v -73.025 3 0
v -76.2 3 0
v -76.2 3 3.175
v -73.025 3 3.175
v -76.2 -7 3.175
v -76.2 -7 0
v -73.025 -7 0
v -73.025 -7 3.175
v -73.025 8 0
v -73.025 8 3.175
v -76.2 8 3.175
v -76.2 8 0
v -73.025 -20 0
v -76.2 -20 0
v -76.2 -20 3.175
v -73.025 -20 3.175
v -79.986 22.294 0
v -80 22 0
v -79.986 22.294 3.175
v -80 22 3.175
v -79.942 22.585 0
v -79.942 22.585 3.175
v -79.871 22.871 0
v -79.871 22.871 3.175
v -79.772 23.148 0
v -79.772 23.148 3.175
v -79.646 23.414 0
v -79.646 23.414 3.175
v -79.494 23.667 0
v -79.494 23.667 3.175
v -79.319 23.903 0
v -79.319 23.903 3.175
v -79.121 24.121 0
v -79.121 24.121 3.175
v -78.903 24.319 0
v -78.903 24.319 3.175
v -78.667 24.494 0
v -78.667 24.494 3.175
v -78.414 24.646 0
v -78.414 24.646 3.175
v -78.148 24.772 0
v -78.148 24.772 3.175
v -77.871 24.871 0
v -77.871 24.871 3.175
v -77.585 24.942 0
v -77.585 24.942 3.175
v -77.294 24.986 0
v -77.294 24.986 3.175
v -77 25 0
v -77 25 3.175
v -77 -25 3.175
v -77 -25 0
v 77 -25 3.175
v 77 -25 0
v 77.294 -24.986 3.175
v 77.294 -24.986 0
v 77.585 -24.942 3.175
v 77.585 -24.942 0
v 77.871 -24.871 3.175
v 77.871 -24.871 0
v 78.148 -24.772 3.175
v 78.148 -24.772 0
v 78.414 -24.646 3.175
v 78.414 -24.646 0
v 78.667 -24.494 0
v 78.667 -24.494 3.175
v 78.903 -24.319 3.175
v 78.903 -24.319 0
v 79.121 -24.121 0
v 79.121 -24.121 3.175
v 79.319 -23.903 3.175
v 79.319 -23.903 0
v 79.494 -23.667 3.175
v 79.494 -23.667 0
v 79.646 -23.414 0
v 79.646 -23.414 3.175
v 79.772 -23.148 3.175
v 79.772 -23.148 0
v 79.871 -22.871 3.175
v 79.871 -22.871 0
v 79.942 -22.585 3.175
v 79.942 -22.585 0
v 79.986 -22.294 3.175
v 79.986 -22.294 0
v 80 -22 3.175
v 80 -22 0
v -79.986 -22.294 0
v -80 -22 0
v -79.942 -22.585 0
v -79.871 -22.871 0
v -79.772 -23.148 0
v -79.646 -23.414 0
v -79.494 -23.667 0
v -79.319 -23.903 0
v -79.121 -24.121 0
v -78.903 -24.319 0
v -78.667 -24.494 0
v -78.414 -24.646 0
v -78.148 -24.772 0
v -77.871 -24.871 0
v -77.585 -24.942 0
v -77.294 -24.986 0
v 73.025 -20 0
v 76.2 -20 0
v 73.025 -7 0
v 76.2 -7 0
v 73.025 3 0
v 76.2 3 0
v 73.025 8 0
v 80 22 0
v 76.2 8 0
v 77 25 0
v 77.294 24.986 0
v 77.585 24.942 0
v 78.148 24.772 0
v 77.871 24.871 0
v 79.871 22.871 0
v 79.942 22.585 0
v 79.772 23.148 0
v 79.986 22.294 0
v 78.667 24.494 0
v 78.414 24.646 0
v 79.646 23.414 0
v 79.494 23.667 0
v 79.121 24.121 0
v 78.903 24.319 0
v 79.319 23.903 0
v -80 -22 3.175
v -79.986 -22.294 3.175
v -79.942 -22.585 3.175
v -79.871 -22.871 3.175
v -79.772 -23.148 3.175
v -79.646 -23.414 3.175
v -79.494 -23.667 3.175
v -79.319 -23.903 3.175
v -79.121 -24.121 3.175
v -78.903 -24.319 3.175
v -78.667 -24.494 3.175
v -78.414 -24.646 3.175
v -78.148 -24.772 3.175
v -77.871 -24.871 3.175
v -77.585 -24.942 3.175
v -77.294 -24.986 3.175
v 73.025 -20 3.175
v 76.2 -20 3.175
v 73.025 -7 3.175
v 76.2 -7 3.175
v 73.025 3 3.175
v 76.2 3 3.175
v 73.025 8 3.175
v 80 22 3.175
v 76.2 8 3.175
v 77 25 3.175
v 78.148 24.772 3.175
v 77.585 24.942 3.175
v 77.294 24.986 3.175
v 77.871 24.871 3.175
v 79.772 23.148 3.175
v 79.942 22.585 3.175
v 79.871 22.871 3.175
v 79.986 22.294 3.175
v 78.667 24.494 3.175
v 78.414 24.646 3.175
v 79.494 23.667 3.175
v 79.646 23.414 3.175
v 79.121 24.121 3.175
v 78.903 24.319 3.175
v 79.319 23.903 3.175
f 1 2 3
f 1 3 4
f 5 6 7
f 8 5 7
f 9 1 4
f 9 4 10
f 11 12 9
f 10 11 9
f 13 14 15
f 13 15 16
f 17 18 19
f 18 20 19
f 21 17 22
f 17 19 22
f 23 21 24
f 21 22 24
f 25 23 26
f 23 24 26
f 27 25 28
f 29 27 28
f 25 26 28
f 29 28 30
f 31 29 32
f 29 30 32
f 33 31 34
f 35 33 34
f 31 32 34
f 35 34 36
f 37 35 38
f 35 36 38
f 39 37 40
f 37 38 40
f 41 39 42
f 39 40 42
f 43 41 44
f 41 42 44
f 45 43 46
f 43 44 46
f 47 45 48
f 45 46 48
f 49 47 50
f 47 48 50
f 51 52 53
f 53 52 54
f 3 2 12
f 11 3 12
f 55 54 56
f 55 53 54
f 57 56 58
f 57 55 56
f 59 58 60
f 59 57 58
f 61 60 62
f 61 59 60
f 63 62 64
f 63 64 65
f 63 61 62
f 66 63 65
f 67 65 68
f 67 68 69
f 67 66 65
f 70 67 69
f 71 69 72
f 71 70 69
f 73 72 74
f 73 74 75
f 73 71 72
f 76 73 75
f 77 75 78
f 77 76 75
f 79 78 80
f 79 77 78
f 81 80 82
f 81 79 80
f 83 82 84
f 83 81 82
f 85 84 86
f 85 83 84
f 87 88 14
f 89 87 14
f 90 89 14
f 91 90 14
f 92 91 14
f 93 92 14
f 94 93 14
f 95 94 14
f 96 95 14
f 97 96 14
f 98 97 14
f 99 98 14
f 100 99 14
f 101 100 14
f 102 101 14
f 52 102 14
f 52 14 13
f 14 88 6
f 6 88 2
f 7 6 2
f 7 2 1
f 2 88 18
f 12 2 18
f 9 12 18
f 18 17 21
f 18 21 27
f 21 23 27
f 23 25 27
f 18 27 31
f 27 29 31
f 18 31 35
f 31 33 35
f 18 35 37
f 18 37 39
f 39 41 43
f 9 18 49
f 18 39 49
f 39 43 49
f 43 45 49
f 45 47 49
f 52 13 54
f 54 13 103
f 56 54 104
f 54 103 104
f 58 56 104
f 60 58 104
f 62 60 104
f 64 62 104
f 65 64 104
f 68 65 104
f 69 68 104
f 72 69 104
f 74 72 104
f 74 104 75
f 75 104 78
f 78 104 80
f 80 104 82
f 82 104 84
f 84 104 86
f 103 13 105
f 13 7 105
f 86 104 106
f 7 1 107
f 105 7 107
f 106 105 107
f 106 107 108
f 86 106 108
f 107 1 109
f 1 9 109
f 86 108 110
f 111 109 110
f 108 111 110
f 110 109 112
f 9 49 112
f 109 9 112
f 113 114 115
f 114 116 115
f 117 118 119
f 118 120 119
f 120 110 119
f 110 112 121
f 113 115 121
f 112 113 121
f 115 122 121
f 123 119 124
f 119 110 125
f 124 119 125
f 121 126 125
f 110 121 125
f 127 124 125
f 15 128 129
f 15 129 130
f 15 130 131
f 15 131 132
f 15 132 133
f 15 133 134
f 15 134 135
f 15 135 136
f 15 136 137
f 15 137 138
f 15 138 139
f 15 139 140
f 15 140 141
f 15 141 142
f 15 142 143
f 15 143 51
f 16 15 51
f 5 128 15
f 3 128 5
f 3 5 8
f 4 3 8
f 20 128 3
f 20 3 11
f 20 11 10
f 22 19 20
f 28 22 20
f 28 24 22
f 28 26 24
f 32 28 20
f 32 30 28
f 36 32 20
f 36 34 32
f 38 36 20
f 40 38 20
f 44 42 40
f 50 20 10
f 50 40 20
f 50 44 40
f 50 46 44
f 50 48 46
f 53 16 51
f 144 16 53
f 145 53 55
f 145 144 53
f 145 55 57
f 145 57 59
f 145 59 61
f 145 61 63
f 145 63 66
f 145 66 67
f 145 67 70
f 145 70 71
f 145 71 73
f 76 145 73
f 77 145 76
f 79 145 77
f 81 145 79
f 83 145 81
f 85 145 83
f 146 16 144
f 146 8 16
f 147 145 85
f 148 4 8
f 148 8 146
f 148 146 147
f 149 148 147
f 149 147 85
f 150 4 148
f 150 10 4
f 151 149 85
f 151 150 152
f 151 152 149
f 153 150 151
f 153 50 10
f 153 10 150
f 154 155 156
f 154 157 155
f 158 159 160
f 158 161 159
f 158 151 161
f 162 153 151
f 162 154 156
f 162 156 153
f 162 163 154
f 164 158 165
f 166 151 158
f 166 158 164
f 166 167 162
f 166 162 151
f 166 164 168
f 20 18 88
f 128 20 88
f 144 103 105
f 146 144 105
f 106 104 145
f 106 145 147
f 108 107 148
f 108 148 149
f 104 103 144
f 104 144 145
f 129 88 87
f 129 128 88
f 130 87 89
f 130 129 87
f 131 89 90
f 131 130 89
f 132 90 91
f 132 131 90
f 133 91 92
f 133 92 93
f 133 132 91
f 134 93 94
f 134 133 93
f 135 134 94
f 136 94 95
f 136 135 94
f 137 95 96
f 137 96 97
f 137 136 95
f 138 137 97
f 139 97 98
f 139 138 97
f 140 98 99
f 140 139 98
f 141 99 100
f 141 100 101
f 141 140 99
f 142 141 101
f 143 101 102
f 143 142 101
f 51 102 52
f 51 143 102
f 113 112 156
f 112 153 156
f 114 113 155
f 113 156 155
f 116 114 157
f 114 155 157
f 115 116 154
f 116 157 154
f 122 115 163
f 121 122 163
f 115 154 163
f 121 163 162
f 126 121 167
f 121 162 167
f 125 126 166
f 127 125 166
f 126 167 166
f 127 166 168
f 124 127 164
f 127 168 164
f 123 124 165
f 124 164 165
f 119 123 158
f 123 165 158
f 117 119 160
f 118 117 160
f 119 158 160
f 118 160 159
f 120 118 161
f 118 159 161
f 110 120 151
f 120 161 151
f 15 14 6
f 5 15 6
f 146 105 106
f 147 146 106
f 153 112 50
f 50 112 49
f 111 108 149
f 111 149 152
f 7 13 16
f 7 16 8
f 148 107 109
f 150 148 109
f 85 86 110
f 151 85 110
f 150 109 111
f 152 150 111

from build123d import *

# Parameters (mm, degrees)
SKETCH1_W           = 3.175
SKETCH1_H           = 13
SKETCH1_H_2         = 5
BOSS_EXTRUDE1_DEPTH = 3.175
FILLET2_R           = 3
FILLET3_R           = 3


with BuildPart() as part:
    # Sketch1 → Boss-Extrude1 (new body)
    with BuildSketch(Plane.XY):
        Polygon((-80, -25), (-76.2, -25), (76.2, -25), (80, -25), (80, 25), (-80, 25), (-80, 8), (-80, 3), (-80, -7), align=None)
        with Locations((-74.6125, -13.5)):
            Rectangle(SKETCH1_W, SKETCH1_H, mode=Mode.SUBTRACT)
        with Locations((74.6125, -13.5)):
            Rectangle(SKETCH1_W, SKETCH1_H, mode=Mode.SUBTRACT)
        with Locations((-74.6125, 5.5)):
            Rectangle(SKETCH1_W, SKETCH1_H_2, mode=Mode.SUBTRACT)
        with Locations((74.6125, 5.5)):
            Rectangle(SKETCH1_W, SKETCH1_H_2, mode=Mode.SUBTRACT)
    extrude(amount=BOSS_EXTRUDE1_DEPTH)

    # Fillet2
    fillet2_edges = [part.edges().sort_by_distance(p)[0] for p in [
        (-80, 25, 1.5875),
    ]]
    fillet(fillet2_edges, radius=FILLET2_R)

    # Fillet3
    fillet3_edges = [part.edges().sort_by_distance(p)[0] for p in [
        (80, -25, 1.5875),
        (-80, -25, 1.5875),
        (80, 25, 1.5875),
    ]]
    fillet(fillet3_edges, radius=FILLET3_R)


solid = part.part
